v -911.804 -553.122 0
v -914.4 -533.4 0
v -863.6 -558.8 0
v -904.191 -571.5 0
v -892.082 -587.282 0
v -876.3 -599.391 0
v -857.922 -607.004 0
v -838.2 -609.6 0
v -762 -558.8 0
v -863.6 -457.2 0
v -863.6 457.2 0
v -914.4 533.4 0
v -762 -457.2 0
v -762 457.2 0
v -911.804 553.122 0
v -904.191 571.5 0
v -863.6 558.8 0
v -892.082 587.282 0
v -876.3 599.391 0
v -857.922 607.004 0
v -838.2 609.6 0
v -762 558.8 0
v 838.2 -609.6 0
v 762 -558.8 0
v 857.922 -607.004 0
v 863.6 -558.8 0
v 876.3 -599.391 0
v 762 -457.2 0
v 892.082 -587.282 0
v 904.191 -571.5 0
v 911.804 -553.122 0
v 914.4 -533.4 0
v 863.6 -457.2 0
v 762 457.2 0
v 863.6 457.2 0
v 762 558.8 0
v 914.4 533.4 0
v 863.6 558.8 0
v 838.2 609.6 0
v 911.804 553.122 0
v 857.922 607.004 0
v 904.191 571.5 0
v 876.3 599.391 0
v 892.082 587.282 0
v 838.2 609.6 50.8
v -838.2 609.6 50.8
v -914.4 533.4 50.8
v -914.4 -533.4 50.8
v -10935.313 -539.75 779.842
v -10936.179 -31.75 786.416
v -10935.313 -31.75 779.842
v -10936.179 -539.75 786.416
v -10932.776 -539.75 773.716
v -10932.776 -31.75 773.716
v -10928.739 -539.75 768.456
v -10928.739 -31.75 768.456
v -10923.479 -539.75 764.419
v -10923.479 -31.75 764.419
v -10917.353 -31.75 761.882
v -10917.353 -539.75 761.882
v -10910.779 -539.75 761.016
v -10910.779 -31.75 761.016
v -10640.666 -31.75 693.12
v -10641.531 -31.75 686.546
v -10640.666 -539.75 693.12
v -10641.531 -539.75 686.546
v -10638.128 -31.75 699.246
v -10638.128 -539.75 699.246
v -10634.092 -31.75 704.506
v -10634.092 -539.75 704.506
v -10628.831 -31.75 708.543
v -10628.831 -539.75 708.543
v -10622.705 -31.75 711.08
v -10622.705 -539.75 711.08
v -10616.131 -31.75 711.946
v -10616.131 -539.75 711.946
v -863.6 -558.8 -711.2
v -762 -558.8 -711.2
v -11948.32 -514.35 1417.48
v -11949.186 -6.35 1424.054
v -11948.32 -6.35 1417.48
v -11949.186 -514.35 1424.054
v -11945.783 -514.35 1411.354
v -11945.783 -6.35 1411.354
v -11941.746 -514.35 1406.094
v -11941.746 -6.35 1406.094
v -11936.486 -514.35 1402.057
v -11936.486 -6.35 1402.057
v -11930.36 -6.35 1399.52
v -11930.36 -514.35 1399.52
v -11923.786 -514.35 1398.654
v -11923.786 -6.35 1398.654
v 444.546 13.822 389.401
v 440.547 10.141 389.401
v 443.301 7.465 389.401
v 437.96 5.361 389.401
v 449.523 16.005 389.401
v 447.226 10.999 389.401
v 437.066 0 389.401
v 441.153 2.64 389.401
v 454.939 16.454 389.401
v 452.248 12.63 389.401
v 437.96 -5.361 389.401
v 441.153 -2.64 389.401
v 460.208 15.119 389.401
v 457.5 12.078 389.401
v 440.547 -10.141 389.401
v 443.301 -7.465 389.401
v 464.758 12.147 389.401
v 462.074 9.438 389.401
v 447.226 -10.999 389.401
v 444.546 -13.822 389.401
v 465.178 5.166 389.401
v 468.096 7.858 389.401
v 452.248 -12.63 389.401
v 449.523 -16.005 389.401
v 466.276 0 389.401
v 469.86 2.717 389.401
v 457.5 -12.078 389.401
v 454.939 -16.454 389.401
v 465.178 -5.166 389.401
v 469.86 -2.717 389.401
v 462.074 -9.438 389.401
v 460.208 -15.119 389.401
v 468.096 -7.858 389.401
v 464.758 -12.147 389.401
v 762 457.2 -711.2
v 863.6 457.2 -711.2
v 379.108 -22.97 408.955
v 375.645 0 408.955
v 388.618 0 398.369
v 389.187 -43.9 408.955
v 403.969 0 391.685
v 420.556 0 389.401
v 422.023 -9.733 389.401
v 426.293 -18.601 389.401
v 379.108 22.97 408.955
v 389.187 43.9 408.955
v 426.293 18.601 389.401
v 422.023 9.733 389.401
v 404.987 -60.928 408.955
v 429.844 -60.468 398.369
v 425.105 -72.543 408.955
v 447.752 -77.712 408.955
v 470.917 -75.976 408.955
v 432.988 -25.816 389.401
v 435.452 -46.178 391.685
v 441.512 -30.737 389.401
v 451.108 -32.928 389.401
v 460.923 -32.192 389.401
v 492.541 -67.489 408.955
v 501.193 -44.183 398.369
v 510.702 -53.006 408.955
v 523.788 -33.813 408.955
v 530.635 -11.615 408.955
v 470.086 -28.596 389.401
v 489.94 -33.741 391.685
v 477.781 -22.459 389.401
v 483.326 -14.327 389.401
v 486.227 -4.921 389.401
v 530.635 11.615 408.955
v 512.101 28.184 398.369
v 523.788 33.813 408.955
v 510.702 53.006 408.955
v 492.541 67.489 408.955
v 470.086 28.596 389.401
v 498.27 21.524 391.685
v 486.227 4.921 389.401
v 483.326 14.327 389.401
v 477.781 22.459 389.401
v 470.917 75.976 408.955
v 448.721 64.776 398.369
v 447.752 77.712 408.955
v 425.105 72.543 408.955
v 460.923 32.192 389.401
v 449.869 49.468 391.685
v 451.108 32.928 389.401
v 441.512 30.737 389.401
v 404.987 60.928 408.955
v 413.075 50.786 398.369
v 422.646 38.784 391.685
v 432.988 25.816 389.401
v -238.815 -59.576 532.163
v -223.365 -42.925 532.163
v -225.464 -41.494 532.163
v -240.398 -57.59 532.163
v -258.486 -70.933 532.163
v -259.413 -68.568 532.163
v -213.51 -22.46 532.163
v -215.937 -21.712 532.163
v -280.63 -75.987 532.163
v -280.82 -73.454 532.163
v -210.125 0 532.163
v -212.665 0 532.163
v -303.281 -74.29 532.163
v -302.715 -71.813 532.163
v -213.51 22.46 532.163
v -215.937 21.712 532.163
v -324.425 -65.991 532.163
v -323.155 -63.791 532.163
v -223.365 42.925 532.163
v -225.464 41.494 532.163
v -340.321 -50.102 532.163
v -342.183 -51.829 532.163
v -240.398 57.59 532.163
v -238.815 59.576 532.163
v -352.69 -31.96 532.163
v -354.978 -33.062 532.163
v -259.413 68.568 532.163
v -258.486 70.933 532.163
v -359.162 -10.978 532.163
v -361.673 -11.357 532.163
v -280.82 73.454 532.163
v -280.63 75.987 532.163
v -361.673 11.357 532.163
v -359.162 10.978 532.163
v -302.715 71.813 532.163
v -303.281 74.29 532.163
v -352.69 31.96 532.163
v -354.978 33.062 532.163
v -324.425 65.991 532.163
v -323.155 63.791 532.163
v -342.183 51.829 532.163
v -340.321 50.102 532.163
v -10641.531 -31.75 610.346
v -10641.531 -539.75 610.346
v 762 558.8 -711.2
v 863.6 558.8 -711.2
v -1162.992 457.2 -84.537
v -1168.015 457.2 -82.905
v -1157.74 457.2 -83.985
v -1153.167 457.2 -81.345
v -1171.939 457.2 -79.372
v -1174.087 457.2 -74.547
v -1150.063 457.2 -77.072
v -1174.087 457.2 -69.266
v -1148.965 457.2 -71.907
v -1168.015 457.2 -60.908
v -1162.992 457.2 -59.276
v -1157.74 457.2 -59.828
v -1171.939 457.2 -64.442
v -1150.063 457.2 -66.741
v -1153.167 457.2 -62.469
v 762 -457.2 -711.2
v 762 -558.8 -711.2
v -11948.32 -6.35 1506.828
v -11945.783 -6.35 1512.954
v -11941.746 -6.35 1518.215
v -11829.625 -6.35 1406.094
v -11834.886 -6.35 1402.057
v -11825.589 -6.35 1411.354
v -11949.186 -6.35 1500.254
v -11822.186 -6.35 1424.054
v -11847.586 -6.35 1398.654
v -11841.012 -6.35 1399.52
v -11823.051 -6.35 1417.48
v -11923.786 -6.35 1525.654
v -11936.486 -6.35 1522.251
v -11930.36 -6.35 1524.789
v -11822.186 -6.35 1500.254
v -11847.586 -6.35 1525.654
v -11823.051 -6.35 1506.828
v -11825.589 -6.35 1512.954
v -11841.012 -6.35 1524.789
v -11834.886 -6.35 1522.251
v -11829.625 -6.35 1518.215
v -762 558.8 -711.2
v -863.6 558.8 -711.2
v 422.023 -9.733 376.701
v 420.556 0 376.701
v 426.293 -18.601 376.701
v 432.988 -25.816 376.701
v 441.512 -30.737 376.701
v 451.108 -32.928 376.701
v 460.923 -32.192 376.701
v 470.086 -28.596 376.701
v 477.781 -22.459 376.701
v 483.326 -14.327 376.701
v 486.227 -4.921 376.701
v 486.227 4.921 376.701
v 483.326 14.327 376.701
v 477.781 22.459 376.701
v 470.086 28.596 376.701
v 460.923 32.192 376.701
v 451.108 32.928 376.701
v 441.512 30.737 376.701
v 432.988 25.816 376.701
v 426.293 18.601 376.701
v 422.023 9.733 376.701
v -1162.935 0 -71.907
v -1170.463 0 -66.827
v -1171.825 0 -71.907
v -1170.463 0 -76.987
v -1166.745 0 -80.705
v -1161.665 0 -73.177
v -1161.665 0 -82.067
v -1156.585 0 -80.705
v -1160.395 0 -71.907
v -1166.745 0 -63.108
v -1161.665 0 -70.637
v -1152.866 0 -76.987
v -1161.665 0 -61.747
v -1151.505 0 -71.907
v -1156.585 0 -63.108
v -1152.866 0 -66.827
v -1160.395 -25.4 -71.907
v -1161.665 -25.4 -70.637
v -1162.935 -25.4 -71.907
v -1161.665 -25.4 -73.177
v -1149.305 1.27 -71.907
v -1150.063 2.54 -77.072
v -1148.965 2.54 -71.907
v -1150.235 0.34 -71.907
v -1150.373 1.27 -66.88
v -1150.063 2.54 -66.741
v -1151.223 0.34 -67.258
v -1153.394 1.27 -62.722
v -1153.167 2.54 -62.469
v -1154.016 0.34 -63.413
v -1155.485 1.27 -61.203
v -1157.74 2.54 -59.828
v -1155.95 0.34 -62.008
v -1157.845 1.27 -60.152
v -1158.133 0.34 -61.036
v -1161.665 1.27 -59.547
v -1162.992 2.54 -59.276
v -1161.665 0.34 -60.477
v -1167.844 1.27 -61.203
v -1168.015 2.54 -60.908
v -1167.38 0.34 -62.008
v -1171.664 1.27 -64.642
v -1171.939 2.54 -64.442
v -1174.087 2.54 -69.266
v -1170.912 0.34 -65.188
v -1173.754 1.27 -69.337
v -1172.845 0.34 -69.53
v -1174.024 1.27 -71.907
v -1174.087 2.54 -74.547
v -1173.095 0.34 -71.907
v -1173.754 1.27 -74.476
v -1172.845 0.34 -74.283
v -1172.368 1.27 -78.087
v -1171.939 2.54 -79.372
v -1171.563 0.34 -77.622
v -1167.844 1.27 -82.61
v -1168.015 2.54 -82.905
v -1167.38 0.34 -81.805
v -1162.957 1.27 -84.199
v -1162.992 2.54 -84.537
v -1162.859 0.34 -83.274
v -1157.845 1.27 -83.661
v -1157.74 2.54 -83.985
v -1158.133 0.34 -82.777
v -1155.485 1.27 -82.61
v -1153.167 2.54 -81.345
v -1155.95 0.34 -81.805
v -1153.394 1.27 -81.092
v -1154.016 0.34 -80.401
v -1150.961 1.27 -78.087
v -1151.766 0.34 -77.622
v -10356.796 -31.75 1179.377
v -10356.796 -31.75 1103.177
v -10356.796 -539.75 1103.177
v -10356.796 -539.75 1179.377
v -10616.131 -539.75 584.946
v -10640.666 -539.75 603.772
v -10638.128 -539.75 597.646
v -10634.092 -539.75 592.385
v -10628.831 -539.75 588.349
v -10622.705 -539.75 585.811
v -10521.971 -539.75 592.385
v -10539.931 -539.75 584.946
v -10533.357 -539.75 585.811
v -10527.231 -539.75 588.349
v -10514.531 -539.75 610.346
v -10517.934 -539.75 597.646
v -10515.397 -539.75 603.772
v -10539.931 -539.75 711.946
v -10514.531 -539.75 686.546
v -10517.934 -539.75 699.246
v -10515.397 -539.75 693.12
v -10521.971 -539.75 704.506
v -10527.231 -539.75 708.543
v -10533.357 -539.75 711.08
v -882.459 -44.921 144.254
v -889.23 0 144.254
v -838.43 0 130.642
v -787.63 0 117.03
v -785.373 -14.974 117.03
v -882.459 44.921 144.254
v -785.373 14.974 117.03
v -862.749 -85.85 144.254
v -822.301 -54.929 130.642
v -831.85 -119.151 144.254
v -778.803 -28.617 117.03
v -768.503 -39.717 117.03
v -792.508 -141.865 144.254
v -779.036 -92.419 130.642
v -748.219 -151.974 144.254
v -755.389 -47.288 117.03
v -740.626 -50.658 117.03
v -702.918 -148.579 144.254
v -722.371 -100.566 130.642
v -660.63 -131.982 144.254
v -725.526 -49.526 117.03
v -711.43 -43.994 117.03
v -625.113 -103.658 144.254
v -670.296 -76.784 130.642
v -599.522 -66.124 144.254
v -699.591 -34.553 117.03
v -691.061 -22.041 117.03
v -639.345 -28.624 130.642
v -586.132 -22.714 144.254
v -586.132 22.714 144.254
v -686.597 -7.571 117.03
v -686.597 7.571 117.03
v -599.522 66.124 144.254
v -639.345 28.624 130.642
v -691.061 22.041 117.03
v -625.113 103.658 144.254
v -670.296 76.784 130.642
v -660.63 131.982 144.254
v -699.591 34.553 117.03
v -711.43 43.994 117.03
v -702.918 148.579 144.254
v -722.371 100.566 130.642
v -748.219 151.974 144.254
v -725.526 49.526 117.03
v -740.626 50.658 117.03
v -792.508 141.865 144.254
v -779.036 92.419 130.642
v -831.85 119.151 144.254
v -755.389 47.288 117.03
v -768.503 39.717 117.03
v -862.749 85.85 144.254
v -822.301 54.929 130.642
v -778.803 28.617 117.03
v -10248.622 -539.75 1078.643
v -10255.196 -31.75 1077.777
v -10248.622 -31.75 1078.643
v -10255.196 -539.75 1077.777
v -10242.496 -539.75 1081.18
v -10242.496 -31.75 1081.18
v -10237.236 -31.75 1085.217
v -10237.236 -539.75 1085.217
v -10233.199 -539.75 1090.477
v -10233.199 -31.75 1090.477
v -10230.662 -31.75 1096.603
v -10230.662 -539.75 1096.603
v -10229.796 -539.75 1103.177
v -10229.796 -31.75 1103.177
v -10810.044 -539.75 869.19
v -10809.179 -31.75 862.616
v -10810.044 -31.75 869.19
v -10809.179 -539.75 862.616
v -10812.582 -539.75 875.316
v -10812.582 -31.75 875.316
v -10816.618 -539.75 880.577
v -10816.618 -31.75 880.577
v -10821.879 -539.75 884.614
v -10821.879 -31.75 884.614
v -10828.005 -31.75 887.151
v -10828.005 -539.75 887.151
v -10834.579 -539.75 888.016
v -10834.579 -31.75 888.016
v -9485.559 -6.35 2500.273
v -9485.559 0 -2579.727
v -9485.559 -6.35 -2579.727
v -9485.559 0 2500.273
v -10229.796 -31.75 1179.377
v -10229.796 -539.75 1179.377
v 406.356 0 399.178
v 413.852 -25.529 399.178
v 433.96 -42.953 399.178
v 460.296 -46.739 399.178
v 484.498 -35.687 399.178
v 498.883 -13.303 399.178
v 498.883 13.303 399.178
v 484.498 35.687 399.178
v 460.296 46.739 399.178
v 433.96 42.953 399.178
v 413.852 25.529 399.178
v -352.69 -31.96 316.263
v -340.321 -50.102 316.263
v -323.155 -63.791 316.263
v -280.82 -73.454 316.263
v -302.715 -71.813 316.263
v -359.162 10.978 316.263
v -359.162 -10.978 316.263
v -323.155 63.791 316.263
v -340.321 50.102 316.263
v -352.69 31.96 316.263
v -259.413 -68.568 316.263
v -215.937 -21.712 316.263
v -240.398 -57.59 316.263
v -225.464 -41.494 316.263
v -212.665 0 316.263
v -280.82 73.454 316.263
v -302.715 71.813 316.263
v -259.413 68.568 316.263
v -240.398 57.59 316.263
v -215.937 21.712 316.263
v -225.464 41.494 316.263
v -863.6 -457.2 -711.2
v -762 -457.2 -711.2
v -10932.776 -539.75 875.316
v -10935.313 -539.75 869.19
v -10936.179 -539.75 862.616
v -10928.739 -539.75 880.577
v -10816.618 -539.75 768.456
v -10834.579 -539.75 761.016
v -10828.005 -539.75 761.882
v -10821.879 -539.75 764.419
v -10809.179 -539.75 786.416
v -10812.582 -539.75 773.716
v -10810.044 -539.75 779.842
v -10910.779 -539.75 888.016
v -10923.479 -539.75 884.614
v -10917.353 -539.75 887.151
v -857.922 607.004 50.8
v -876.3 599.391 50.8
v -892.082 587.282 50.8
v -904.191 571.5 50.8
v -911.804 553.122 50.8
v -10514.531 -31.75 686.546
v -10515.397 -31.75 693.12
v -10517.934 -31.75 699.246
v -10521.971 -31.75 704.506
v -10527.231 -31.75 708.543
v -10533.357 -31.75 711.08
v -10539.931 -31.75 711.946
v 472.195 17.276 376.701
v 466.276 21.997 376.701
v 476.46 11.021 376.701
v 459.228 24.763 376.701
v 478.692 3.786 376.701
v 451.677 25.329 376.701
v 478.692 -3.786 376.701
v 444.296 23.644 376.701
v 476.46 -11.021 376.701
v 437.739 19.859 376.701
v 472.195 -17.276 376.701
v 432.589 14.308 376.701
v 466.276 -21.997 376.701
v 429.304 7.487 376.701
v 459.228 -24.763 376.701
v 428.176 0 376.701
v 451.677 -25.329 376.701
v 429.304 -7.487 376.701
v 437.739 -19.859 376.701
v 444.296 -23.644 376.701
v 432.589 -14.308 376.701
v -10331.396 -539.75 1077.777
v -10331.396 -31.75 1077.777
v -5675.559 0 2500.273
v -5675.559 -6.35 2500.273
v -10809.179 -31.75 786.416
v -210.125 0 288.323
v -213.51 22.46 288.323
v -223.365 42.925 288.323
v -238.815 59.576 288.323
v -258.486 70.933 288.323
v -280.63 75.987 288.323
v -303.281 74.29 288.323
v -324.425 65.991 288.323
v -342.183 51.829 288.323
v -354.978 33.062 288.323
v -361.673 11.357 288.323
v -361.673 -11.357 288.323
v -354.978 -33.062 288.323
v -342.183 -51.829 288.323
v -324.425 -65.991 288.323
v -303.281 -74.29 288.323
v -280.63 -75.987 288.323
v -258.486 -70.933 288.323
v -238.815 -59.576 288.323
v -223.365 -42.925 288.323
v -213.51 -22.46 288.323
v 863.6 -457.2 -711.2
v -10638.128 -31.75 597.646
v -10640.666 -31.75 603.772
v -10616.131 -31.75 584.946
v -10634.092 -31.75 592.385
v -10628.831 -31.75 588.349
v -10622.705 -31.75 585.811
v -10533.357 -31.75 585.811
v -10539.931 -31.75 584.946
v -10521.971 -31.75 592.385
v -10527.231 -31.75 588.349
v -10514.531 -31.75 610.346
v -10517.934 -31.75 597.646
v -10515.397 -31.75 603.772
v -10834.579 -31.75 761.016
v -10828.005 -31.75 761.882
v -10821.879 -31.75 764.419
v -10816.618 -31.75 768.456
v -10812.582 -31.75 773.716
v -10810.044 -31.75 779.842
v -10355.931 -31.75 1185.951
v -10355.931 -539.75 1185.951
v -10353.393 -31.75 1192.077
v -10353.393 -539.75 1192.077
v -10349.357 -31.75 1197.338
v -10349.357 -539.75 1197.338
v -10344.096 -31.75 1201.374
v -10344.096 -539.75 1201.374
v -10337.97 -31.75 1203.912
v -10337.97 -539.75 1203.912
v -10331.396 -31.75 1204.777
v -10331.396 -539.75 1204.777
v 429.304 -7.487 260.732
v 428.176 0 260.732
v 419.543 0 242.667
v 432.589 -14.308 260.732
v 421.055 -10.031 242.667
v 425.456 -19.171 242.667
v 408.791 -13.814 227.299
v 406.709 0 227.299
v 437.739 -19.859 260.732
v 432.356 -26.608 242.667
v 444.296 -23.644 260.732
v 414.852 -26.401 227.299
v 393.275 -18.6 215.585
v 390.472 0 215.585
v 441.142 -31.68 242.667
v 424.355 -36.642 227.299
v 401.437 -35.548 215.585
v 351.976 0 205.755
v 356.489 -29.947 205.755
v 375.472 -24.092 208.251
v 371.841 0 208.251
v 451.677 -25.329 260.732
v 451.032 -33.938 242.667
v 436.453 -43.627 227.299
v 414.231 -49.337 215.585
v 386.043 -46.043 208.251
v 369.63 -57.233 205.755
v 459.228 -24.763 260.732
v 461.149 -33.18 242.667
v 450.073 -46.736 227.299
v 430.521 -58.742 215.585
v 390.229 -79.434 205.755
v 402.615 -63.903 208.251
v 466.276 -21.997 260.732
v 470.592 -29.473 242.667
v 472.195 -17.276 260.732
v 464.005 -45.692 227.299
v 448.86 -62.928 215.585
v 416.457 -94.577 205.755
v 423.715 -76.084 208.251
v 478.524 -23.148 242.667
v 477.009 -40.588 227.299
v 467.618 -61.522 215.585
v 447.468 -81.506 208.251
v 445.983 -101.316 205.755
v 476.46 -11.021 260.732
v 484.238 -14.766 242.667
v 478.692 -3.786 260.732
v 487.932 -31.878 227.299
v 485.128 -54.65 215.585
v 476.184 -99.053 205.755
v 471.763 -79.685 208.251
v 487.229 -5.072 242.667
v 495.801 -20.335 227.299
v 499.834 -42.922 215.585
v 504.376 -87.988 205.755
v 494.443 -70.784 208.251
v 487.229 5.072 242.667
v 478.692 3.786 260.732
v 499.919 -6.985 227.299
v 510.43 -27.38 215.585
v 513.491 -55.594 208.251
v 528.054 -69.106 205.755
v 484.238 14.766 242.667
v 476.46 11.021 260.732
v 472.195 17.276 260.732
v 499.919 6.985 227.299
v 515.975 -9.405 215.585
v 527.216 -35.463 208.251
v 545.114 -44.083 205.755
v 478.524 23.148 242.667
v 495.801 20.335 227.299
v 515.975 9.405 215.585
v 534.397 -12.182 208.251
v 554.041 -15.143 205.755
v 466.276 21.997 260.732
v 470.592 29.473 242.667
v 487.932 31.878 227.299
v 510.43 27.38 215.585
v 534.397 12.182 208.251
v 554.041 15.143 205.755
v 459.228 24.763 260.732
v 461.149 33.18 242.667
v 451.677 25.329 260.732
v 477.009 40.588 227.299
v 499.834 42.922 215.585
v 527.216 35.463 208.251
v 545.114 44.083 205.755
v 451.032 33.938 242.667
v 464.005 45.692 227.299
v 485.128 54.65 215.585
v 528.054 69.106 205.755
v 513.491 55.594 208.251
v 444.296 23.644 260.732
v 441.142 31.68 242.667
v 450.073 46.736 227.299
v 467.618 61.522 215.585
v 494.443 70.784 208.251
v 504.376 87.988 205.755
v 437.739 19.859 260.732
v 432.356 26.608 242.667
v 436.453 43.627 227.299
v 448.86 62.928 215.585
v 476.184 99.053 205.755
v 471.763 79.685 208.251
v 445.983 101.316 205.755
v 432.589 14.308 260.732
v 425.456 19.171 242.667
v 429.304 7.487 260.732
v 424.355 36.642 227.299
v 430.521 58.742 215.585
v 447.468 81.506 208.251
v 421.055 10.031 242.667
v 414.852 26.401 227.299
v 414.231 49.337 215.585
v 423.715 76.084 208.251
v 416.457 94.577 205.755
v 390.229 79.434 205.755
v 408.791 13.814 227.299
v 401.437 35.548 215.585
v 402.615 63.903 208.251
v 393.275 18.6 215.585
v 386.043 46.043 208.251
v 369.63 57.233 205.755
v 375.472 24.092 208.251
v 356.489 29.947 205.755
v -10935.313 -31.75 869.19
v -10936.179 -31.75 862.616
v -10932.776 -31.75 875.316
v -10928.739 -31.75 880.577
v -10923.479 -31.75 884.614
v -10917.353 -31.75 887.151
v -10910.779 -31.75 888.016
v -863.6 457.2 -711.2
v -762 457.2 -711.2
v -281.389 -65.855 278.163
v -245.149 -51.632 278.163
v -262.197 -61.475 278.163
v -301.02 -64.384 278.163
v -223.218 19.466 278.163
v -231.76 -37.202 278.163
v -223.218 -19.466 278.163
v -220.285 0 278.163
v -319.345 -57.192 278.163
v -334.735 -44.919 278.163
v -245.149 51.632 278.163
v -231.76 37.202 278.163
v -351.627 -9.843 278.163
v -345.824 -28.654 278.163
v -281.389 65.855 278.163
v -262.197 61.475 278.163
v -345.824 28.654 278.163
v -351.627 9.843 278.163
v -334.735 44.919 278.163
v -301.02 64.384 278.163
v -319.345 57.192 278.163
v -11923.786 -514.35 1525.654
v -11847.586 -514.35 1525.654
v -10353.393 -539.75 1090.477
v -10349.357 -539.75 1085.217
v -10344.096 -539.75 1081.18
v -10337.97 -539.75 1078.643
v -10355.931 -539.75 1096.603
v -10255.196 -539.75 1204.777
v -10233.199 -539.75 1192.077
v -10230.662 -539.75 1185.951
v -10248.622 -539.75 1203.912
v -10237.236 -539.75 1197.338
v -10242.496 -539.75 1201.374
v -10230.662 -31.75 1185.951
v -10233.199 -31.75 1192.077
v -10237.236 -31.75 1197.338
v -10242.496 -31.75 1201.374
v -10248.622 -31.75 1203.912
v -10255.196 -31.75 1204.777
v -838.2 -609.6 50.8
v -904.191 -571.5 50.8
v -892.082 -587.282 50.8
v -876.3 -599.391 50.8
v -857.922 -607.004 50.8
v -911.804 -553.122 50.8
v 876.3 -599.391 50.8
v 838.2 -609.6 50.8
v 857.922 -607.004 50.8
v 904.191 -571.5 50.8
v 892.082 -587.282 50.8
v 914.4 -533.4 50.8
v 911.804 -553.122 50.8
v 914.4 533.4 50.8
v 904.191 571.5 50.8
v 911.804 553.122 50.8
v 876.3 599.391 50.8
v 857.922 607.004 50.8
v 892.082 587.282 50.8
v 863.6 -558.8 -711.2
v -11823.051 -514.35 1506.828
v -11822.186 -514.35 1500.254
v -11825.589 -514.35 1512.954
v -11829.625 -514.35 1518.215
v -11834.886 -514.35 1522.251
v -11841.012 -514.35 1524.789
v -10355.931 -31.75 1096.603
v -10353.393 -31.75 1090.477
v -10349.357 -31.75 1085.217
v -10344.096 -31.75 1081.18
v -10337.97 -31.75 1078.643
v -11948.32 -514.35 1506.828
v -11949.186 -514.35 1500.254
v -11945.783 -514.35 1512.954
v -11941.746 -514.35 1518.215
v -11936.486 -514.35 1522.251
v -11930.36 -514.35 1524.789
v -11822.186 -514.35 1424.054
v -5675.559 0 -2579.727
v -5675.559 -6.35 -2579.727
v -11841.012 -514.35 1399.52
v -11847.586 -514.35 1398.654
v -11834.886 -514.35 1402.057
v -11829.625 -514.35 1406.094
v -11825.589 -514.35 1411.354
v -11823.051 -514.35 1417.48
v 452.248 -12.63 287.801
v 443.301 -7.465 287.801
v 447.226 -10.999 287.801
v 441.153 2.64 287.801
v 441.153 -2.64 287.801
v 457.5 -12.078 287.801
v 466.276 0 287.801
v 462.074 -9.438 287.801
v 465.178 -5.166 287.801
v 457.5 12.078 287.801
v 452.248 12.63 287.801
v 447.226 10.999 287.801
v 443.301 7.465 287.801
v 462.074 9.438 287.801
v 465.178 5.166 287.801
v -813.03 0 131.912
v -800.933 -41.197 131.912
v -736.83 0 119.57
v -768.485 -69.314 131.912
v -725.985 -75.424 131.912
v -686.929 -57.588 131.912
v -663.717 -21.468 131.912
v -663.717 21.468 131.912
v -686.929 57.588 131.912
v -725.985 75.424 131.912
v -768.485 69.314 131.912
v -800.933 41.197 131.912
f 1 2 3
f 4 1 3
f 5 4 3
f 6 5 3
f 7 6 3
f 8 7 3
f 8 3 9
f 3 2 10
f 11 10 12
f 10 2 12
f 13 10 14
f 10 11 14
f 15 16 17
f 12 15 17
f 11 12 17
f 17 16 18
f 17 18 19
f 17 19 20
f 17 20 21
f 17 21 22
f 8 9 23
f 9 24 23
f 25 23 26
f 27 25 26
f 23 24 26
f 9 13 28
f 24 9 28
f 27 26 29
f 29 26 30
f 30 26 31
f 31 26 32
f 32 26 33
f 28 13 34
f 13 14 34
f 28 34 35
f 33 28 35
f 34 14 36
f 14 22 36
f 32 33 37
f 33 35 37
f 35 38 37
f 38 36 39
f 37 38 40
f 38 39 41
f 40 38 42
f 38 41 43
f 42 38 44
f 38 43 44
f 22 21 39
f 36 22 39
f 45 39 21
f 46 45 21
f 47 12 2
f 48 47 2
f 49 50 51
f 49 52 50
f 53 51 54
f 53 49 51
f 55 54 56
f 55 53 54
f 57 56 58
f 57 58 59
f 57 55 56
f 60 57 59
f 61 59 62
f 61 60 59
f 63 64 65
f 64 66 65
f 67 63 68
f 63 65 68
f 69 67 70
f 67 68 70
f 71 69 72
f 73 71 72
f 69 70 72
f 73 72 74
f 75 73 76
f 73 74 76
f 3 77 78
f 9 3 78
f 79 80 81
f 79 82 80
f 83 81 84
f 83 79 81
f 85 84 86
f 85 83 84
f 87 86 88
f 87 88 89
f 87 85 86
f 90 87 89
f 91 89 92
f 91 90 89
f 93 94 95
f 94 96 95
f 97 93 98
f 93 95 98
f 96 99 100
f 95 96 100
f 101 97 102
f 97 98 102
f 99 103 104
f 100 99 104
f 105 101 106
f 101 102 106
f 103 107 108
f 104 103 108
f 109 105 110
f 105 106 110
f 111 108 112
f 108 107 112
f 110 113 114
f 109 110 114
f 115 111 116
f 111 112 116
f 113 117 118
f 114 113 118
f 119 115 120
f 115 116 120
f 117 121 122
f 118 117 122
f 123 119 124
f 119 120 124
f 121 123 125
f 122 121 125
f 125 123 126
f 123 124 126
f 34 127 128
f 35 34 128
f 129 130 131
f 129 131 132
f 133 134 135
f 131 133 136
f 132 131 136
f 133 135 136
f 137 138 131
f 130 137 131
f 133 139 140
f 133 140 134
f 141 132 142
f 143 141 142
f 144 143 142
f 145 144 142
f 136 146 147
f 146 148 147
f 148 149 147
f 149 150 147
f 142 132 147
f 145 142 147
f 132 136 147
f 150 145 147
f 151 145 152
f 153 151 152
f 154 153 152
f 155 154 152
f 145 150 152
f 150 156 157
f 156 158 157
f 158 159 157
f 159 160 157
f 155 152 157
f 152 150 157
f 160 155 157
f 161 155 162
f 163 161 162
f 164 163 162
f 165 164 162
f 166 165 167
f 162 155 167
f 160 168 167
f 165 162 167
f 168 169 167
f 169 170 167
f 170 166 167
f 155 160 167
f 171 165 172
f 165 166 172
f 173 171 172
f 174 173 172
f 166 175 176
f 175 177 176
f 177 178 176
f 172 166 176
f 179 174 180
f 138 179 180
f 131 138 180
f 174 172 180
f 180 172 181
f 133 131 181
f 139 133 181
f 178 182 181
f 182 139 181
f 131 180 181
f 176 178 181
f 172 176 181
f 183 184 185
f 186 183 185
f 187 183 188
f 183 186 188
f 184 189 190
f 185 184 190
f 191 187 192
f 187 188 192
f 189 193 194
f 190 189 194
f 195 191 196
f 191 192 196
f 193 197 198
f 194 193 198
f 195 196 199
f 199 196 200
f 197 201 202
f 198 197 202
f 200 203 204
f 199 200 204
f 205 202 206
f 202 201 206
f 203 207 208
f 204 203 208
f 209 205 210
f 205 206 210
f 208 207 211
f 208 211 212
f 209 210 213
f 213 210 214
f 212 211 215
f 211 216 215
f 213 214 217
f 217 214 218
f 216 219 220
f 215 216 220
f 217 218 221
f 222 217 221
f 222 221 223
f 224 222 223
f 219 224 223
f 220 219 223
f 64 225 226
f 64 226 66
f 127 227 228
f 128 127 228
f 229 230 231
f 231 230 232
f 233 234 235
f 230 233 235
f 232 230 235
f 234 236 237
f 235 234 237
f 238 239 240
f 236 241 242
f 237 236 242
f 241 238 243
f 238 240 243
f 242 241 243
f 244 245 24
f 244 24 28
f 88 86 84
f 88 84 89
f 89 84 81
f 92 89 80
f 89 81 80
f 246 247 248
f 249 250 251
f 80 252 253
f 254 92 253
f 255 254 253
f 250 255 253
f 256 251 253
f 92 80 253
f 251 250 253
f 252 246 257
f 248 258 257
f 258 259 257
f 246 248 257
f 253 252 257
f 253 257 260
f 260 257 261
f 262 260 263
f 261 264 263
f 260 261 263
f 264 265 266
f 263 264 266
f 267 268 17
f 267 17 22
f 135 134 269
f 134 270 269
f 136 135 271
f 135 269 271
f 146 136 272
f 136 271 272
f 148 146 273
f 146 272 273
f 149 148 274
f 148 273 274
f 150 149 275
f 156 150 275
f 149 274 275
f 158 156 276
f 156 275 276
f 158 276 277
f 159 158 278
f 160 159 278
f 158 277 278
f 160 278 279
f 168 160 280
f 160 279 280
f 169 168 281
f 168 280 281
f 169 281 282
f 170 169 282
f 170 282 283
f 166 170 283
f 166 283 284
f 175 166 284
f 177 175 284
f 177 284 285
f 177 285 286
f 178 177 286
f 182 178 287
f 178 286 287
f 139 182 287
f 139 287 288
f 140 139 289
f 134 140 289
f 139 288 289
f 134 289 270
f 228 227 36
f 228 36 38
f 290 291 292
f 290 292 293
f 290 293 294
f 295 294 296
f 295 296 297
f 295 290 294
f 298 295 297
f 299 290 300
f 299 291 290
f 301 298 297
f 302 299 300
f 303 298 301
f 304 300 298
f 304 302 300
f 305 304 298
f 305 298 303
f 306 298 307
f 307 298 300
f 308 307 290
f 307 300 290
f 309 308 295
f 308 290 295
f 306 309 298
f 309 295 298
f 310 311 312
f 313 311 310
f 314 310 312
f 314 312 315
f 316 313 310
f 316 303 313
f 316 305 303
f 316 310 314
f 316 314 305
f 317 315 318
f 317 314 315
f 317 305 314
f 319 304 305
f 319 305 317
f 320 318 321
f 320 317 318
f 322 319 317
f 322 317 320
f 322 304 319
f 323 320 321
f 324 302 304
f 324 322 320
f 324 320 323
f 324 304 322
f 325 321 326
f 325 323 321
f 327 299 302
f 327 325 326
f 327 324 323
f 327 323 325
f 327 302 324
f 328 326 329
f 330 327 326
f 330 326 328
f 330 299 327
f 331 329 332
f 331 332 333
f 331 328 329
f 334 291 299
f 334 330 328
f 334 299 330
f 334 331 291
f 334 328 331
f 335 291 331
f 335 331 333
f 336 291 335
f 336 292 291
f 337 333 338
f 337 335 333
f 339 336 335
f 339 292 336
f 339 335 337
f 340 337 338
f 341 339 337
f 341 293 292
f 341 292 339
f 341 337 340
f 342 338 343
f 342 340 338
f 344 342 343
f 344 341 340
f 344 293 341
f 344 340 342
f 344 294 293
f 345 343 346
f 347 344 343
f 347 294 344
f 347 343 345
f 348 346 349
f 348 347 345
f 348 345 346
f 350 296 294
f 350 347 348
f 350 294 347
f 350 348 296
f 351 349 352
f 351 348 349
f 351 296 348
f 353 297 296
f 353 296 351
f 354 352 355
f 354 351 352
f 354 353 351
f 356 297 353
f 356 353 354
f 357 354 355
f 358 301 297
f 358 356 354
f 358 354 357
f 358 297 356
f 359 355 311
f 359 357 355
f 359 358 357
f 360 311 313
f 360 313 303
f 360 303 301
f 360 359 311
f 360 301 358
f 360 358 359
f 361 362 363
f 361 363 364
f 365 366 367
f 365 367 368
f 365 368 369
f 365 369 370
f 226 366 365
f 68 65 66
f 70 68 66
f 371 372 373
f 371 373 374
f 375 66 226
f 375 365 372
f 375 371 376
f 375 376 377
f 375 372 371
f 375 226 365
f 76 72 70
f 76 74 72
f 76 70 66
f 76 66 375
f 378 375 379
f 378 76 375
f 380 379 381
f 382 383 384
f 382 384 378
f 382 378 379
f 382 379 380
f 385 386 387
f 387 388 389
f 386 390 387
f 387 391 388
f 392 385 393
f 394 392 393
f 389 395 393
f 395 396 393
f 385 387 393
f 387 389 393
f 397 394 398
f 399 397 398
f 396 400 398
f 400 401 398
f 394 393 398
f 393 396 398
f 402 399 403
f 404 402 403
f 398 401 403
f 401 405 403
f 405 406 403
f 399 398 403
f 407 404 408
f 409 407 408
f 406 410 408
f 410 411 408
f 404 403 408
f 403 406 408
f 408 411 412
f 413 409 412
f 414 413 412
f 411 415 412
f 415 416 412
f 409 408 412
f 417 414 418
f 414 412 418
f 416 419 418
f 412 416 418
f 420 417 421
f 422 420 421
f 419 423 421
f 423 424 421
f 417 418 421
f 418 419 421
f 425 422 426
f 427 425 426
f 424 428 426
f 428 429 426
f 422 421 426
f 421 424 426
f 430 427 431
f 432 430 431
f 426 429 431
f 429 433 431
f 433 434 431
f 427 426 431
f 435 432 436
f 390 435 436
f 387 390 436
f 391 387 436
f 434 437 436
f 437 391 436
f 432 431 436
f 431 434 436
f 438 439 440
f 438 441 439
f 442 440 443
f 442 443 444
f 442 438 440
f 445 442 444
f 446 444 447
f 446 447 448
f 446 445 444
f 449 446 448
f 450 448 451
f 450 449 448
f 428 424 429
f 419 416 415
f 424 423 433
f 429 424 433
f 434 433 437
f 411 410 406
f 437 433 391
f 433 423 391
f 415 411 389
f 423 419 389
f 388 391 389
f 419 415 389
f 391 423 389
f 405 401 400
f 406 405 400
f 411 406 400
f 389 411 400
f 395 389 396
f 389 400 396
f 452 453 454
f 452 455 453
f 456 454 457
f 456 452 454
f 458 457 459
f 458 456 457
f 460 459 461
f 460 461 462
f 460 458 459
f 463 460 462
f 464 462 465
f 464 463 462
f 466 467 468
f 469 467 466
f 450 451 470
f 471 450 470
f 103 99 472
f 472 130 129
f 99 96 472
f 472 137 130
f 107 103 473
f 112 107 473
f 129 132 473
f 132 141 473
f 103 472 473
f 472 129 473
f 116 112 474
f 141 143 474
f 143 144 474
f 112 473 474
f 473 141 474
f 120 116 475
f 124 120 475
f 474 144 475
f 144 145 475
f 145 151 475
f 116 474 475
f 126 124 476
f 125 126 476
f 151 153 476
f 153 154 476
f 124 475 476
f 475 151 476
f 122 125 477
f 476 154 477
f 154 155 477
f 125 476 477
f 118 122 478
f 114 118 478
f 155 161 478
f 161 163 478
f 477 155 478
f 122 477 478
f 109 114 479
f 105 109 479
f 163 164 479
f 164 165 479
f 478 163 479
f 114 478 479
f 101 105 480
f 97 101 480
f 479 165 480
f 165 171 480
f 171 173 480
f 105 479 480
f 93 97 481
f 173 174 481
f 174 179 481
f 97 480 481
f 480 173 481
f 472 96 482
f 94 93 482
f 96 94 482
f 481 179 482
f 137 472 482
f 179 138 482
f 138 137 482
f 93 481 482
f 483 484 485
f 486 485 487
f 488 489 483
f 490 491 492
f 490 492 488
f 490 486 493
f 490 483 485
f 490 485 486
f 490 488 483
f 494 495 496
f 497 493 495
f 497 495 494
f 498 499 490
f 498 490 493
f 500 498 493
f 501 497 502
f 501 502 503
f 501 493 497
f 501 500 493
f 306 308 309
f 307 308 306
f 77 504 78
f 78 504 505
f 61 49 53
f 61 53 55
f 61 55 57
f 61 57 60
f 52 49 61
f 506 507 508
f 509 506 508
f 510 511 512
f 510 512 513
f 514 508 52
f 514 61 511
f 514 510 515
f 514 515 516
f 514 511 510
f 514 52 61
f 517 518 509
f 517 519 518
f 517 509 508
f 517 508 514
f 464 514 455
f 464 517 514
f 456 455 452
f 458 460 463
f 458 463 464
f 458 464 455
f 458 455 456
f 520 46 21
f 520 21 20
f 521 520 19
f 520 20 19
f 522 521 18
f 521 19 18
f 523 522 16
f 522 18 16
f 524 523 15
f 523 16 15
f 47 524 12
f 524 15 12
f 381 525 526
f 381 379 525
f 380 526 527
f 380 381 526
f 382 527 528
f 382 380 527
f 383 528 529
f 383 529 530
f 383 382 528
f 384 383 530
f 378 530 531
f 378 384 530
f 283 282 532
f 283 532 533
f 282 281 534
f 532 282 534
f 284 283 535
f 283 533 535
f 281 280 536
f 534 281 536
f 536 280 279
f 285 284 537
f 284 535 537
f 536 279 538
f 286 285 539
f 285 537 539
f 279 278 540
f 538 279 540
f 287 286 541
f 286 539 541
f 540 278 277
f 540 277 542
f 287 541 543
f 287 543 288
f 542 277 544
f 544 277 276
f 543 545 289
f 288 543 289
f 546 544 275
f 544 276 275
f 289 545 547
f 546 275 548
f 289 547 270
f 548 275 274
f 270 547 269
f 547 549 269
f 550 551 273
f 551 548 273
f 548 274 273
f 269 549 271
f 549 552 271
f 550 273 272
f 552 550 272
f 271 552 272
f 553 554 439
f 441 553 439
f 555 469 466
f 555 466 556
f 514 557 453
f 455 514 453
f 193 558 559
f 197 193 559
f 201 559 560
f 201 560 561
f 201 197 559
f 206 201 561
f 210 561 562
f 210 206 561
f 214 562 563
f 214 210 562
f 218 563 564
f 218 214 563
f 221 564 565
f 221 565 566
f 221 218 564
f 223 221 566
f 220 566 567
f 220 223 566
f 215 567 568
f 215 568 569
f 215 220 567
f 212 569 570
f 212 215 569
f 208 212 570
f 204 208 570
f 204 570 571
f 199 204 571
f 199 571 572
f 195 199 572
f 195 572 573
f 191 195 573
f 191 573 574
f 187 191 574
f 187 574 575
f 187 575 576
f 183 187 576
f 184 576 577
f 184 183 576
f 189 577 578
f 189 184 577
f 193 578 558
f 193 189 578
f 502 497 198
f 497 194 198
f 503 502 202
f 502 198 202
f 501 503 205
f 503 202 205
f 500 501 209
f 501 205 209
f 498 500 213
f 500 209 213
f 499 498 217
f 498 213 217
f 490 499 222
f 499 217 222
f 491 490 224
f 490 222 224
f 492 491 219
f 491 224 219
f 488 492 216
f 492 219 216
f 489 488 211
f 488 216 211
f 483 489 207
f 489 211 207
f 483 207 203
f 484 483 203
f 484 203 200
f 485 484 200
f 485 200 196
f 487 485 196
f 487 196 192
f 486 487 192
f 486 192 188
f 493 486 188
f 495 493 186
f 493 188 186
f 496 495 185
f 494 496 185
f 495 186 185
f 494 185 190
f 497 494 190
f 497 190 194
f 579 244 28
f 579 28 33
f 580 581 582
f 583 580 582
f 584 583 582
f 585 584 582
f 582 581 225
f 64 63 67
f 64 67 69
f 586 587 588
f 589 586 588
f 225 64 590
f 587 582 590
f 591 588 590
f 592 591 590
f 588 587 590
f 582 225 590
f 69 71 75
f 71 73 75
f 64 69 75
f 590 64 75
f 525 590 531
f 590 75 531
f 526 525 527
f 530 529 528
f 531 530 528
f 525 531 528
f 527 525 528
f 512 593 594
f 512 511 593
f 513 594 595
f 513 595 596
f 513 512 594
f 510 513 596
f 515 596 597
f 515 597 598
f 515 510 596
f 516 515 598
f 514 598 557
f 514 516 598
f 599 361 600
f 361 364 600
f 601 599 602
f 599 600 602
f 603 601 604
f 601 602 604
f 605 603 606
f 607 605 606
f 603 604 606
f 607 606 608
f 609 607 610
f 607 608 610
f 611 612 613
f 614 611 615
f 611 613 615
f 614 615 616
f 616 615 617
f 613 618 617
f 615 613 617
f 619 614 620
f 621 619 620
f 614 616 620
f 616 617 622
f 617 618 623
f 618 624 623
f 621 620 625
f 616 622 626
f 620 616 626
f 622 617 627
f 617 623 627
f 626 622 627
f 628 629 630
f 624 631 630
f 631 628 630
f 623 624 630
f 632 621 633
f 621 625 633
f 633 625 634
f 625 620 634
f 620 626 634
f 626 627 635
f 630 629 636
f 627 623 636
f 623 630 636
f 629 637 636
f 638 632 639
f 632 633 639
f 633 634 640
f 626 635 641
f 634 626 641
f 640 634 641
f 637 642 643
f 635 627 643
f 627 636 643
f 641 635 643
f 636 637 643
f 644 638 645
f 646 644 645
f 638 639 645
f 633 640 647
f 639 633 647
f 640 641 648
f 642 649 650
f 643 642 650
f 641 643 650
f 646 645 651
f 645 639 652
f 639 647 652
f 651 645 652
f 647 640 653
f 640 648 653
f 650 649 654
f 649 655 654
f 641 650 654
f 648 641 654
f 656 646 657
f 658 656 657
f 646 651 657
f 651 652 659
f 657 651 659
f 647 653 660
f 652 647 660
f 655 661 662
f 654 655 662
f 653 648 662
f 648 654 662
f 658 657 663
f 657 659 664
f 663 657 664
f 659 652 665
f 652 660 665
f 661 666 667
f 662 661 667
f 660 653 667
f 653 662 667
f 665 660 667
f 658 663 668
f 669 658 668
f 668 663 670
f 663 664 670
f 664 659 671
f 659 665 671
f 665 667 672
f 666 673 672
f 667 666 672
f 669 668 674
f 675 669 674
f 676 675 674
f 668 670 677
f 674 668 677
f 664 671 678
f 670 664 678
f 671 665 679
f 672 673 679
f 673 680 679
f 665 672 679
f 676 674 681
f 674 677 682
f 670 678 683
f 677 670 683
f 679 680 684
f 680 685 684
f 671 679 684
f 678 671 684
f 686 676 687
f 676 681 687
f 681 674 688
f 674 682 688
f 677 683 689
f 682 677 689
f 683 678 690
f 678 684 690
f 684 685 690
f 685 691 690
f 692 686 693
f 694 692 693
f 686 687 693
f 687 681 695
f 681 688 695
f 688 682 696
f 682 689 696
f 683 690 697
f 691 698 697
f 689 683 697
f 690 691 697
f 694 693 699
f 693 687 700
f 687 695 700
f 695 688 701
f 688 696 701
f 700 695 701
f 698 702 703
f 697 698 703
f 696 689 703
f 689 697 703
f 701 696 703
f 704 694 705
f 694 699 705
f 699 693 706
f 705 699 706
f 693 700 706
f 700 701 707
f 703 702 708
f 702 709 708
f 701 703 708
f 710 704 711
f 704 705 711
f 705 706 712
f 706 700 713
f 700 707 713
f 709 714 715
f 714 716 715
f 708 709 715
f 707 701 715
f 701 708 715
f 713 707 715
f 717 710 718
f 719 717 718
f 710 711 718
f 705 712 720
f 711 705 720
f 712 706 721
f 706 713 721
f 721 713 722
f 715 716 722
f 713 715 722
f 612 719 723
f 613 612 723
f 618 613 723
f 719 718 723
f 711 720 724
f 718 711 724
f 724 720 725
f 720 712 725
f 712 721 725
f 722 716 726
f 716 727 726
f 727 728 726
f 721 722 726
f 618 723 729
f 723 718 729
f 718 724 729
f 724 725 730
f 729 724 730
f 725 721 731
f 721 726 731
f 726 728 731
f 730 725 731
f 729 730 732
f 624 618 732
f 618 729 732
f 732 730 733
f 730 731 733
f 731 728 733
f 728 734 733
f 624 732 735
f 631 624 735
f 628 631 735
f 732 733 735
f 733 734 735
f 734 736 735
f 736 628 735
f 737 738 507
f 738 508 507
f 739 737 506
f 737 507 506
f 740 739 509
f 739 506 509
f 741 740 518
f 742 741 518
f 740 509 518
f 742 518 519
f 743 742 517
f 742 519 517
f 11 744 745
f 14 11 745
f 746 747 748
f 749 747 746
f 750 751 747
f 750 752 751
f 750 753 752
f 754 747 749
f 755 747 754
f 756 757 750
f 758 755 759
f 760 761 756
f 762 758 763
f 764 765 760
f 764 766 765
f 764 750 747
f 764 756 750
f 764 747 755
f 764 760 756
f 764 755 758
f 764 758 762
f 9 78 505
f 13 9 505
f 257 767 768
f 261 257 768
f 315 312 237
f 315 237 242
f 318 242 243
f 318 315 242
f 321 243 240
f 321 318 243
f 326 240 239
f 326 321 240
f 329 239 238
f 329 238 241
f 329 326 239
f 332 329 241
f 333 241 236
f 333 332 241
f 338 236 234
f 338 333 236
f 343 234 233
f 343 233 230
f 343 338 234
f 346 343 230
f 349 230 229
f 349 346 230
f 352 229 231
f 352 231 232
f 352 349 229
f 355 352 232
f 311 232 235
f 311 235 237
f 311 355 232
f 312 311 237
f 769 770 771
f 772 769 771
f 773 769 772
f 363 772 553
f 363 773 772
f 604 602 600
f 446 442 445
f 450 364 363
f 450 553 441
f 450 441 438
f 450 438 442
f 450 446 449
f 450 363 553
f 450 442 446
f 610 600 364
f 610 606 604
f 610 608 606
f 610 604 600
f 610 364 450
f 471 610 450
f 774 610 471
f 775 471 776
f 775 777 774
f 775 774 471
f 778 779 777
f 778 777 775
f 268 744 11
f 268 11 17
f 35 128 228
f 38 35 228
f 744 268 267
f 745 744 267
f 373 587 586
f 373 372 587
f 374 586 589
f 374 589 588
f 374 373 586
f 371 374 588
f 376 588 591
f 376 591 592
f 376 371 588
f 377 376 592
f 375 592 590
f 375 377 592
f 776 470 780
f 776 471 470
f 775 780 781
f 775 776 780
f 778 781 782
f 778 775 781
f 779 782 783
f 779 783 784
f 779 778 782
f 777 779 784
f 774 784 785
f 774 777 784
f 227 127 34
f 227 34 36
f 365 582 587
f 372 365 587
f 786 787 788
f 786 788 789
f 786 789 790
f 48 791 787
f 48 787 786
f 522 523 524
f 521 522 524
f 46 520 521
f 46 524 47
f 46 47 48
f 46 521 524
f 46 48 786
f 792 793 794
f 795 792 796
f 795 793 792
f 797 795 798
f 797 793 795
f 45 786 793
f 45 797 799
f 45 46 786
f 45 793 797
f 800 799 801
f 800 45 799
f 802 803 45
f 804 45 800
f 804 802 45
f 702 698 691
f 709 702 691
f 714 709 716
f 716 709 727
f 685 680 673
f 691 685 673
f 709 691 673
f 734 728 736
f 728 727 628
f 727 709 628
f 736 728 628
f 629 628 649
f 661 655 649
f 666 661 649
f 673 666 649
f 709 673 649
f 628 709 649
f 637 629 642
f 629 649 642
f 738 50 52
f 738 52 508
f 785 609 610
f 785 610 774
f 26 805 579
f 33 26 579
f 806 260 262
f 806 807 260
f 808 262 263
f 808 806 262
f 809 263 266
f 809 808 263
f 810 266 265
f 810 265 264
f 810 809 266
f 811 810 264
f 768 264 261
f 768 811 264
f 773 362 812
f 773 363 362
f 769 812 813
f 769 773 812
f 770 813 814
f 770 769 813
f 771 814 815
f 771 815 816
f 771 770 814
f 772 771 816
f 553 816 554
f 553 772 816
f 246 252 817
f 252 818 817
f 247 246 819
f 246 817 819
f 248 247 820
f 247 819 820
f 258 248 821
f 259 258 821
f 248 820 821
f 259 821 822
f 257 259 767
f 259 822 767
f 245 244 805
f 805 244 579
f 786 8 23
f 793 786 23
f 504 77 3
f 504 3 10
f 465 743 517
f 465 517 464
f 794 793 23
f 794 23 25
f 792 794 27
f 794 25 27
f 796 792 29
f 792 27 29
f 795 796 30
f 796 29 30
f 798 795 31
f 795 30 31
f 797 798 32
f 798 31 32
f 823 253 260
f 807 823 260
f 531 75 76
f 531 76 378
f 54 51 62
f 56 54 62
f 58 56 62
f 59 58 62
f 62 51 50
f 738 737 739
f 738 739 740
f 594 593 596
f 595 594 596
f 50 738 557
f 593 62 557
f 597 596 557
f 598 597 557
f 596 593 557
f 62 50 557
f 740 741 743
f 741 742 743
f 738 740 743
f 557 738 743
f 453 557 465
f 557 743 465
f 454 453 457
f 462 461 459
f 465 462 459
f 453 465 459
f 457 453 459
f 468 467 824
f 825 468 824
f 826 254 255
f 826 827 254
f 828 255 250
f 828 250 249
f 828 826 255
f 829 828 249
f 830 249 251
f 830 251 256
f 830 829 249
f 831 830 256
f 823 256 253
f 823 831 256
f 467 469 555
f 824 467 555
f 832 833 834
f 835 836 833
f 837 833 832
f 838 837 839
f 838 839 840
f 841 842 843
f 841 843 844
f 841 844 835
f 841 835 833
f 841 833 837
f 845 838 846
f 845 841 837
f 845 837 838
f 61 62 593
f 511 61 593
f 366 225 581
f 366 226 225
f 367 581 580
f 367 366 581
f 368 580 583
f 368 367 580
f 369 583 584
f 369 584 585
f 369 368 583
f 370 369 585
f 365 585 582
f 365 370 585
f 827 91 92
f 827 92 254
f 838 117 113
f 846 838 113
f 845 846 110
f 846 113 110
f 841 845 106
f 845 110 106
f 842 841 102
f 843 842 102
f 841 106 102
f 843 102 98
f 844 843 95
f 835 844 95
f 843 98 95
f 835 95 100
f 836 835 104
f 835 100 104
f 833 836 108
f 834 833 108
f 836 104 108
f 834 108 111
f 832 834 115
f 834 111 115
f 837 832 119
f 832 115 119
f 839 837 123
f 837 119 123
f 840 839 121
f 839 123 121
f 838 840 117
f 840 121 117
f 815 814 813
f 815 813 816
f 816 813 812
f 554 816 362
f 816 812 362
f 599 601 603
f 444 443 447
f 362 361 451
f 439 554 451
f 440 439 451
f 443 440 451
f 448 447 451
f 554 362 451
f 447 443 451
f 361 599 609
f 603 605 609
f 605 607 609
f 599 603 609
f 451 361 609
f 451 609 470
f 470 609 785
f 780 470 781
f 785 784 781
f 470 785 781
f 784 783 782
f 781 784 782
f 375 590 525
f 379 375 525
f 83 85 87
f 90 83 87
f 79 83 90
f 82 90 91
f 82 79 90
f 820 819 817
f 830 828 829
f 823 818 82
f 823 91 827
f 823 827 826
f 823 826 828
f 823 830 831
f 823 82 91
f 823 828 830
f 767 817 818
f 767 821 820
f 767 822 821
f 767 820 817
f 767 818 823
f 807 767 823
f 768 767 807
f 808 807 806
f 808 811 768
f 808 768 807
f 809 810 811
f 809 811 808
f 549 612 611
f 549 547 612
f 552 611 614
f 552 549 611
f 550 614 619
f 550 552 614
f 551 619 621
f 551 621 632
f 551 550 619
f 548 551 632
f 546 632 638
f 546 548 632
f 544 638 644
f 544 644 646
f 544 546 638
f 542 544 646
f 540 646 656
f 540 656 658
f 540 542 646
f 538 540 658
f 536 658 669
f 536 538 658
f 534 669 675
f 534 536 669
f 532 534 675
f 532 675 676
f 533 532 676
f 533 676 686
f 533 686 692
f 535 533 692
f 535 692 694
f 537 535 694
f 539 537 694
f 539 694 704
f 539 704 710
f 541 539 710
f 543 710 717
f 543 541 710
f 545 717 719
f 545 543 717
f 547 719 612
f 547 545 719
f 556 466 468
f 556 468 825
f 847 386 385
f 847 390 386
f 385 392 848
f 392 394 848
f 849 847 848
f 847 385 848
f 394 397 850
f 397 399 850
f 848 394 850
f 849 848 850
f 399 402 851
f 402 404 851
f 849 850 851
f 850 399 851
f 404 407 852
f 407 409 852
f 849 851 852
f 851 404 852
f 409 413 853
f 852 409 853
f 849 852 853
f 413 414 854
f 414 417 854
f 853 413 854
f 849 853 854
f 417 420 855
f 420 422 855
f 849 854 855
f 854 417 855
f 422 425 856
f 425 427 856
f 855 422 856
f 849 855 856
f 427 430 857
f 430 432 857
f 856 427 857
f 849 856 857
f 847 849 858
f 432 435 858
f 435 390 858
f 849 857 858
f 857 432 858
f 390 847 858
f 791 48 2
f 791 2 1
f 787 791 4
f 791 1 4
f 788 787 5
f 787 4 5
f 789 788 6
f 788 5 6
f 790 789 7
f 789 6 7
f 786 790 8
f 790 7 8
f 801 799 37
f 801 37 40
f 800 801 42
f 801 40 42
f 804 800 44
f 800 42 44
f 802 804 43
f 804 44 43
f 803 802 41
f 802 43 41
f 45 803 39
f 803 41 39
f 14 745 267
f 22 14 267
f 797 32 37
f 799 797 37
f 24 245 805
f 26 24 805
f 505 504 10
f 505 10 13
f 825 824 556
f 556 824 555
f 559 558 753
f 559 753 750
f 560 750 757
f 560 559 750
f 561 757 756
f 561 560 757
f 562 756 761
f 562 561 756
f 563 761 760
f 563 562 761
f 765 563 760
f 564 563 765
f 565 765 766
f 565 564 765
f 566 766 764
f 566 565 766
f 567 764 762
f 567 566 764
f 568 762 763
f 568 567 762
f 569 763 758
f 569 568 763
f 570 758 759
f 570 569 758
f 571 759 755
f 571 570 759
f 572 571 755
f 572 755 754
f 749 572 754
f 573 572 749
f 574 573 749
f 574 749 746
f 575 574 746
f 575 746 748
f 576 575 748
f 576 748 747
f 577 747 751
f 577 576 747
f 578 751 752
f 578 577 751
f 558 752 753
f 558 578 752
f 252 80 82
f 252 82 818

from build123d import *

# Parameters (mm, degrees)
F0_W      = 101.6
F0_H      = 101.6
F1_DEPTH  = 50.8
F2_DEPTH  = 711.2
F3_W      = 2.54
F3_H      = 215.9
F5_SIZE   = 10.16
F8_R      = 12.7
F8_R_2    = 1.27
F9_DEPTH  = 457.2
F10_DEPTH = 25.4
F11_R     = 2.54
F12_W     = 25.4
F12_H     = 115.9687861614
F14_R     = 12.7
F15_DEPTH = 101.6
F16_W     = 3810
F16_H     = 5080
F17_DEPTH = 6.35
F19_W     = 127
F19_H     = 127
F20_DEPTH = 508
F21_R     = 25.4
F22_W     = 127
F22_H     = 127
F23_DEPTH = 508
F25_W     = 127
F25_H     = 127
F26_DEPTH = 508
F27_R     = 25.4
F28_W     = 127
F28_H     = 127
F29_DEPTH = 508
F30_R     = 25.4
F30_2_R   = 25.4


# Not quite as in the source:
# - a feature of the source that left no trace in its solid (it failed there, or was rolled back) is left out


with BuildPart() as f1:
    # F0 (on Top) → F1 (new body)
    with BuildSketch(Plane.XY):
        with BuildLine():
            Line((838.2, 609.6), (-838.2, 609.6))
            ThreePointArc((-838.2, 609.6), (-892.0815367264, 587.2815367264), (-914.4, 533.4))
            Line((-914.4, 533.4), (-914.4, -533.4))
            ThreePointArc((-914.4, -533.4), (-892.0815367264, -587.2815367264), (-838.2, -609.6))
            Line((-838.2, -609.6), (838.2, -609.6))
            ThreePointArc((838.2, -609.6), (892.0815367264, -587.2815367264), (914.4, -533.4))
            Line((914.4, -533.4), (914.4, 533.4))
            ThreePointArc((914.4, 533.4), (892.0815367264, 587.2815367264), (838.2, 609.6))
        make_face()
        with Locations((-812.8, -508)):
            Rectangle(F0_W, F0_H, mode=Mode.SUBTRACT)
        with Locations((812.8, -508)):
            Rectangle(F0_W, F0_H, mode=Mode.SUBTRACT)
        with Locations((-812.8, 508)):
            Rectangle(F0_W, F0_H, mode=Mode.SUBTRACT)
        with Locations((812.8, 508)):
            Rectangle(F0_W, F0_H, mode=Mode.SUBTRACT)
        with Locations((-812.8, -508)):
            Rectangle(F0_W, F0_H)
        with Locations((812.8, -508)):
            Rectangle(F0_W, F0_H)
        with Locations((812.8, 508)):
            Rectangle(F0_W, F0_H)
        with Locations((-812.8, 508)):
            Rectangle(F0_W, F0_H)
    extrude(amount=F1_DEPTH)

    # F0 (on Top) → F2 (join)
    with BuildSketch(Plane.XY):
        with Locations((-812.8, -508)):
            Rectangle(F0_W, F0_H)
        with Locations((-812.8, 508)):
            Rectangle(F0_W, F0_H)
        with Locations((812.8, 508)):
            Rectangle(F0_W, F0_H)
        with Locations((812.8, -508)):
            Rectangle(F0_W, F0_H)
    extrude(amount=-F2_DEPTH)


with BuildPart() as f4:
    # F3 (on Front) → F4 (revolve)
    with BuildSketch(Plane.XZ):
        Polygon((-286.3245010376, 316.2632285118), (-286.3245010376, 278.1632285118), (-210.1245010376, 278.1632285118), (-210.1245010376, 316.2632285118), (-212.6645010376, 316.2632285118), align=None)
        with Locations((-211.3945010376, 424.2132285118)):
            Rectangle(F3_W, F3_H)
    revolve(axis=Axis((-286.3245010376, 0, 405.1632285118), (0, 0, 1)))

    # F5
    f5_edges = [f4.edges().sort_by_distance(p)[0] for p in [
        (-362.524501, 0, 278.163229),
    ]]
    chamfer(f5_edges, length=F5_SIZE)


with BuildPart() as f7:
    # F6 (on Front) → F7 (revolve)
    with BuildSketch(Plane.XZ):
        Polygon((-787.6298852921, 117.0304474873), (-736.8298852921, 117.0304474873), (-736.8298852921, 119.5704474873), (-889.2298852921, 144.2540854383), align=None)
    revolve(axis=Axis((-736.8298852921, 0, 187.9355122422), (0, 0, 1)))


with BuildPart() as f9:
    # F8 (on Front) → F9 (new body)
    with BuildSketch(Plane.XZ):
        with Locations((-1161.6646051407, -71.9066634774)):
            Circle(F8_R)
        with Locations((-1161.6646051407, -71.9066634774)):
            Circle(F8_R_2, mode=Mode.SUBTRACT)
        with Locations((-1161.6646051407, -71.9066634774)):
            Circle(F8_R_2)
    extrude(amount=-F9_DEPTH)

    # F8 (on Front) → F10 (join)
    with BuildSketch(Plane.XZ):
        with Locations((-1161.6646051407, -71.9066634774)):
            Circle(F8_R_2)
    extrude(amount=F10_DEPTH)

    # F11
    f11_edges = [f9.edges().sort_by_distance(p)[0] for p in [
        (-1174.364605, 0, -71.906663),
    ]]
    fillet(f11_edges, radius=F11_R)


with BuildPart() as f13:
    # F12 (on Front) → F13 (revolve)
    with BuildSketch(Plane.XZ):
        Polygon((428.1756336873, 376.7006152139), (453.5756336873, 376.7006152139), (453.5756336873, 389.4006152139), (437.0656336873, 389.4006152139), (420.5556336873, 389.4006152139), (420.5556336873, 376.7006152139), align=None)
        with Locations((440.8756336873, 318.7162221332)):
            Rectangle(F12_W, F12_H)
        with BuildLine():
            Line((351.9756336873, 205.7550829578), (453.5756336873, 205.7550829578))
            Line((453.5756336873, 205.7550829578), (453.5756336873, 260.7318290524))
            Line((453.5756336873, 260.7318290524), (428.1756336873, 260.7318290524))
            ThreePointArc((428.1756336873, 260.7318290524), (398.9567006482, 220.9339369722), (351.9756336873, 205.7550829578))
        make_face()
        with BuildLine():
            Line((420.5556336873, 389.4006152139), (437.0656336873, 389.4006152139))
            Line((437.0656336873, 389.4006152139), (375.645477209, 408.9550829578))
            ThreePointArc((375.645477209, 408.9550829578), (396.0643119403, 394.5012700165), (420.5556336873, 389.4006152139))
        make_face()
    revolve(axis=Axis((453.5756336873, 0, 307.3550829578), (0, 0, 1)))

    # F14 (on face) → F15 (cut)
    with BuildSketch(Plane.XY.offset(389.4006152139)):
        with Locations((453.5756336873, 0)):
            Circle(F14_R)
    extrude(amount=-F15_DEPTH, mode=Mode.SUBTRACT)


with BuildPart() as f17:
    # F16 (on Front) → F17 (new body)
    with BuildSketch(Plane.XZ):
        with Locations((-7580.5585479736, -39.7266790259)):
            Rectangle(F16_W, F16_H)
    extrude(amount=F17_DEPTH)


with BuildPart() as f20:
    # F19 (on face) → F20 (new body)
    with BuildSketch(Plane.XZ.offset(6.35)):
        with Locations((-11885.6859207153, 1462.1543058495)):
            Rectangle(F19_W, F19_H)
    extrude(amount=F20_DEPTH)

    # F21
    f21_edges = [f20.edges().sort_by_distance(p)[0] for p in [
        (-11822.185921, -260.35, 1525.654306),
        (-11949.185921, -260.35, 1525.654306),
        (-11949.185921, -260.35, 1398.654306),
        (-11822.185921, -260.35, 1398.654306),
    ]]
    fillet(f21_edges, radius=F21_R)


with BuildPart() as f23:
    # F22 (on offset) → F23 (new body)
    with BuildSketch(Plane.XZ.offset(31.75)):
        with Locations((-10293.2963371277, 1141.2770350553)):
            Rectangle(F22_W, F22_H)
    extrude(amount=F23_DEPTH)

    # F30#2
    f30_2_edges = [f23.edges().sort_by_distance(p)[0] for p in [
        (-10229.796337, -285.75, 1204.777035),
        (-10356.796337, -285.75, 1204.777035),
        (-10356.796337, -285.75, 1077.777035),
        (-10229.796337, -285.75, 1077.777035),
    ]]
    fillet(f30_2_edges, radius=F30_2_R)


with BuildPart() as f26:
    # F25 (on offset) → F26 (new body)
    with BuildSketch(Plane.XZ.offset(31.75)):
        with Locations((-10872.6787567139, 824.5164741749)):
            Rectangle(F25_W, F25_H)
    extrude(amount=F26_DEPTH)

    # F27
    f27_edges = [f26.edges().sort_by_distance(p)[0] for p in [
        (-10809.178757, -285.75, 761.016474),
        (-10809.178757, -285.75, 888.016474),
        (-10936.178757, -285.75, 888.016474),
        (-10936.178757, -285.75, 761.016474),
    ]]
    fillet(f27_edges, radius=F27_R)


with BuildPart() as f29:
    # F28 (on offset) → F29 (new body)
    with BuildSketch(Plane.XZ.offset(31.75)):
        with Locations((-10578.0310630798, 648.4456999137)):
            Rectangle(F28_W, F28_H)
    extrude(amount=F29_DEPTH)

    # F30
    f30_edges = [f29.edges().sort_by_distance(p)[0] for p in [
        (-10514.531063, -285.75, 711.9457),
        (-10641.531063, -285.75, 711.9457),
        (-10641.531063, -285.75, 584.9457),
        (-10514.531063, -285.75, 584.9457),
    ]]
    fillet(f30_edges, radius=F30_R)


solid = Compound([f1.part, f4.part, f7.part, f9.part, f13.part, f17.part, f20.part, f23.part, f26.part, f29.part])
